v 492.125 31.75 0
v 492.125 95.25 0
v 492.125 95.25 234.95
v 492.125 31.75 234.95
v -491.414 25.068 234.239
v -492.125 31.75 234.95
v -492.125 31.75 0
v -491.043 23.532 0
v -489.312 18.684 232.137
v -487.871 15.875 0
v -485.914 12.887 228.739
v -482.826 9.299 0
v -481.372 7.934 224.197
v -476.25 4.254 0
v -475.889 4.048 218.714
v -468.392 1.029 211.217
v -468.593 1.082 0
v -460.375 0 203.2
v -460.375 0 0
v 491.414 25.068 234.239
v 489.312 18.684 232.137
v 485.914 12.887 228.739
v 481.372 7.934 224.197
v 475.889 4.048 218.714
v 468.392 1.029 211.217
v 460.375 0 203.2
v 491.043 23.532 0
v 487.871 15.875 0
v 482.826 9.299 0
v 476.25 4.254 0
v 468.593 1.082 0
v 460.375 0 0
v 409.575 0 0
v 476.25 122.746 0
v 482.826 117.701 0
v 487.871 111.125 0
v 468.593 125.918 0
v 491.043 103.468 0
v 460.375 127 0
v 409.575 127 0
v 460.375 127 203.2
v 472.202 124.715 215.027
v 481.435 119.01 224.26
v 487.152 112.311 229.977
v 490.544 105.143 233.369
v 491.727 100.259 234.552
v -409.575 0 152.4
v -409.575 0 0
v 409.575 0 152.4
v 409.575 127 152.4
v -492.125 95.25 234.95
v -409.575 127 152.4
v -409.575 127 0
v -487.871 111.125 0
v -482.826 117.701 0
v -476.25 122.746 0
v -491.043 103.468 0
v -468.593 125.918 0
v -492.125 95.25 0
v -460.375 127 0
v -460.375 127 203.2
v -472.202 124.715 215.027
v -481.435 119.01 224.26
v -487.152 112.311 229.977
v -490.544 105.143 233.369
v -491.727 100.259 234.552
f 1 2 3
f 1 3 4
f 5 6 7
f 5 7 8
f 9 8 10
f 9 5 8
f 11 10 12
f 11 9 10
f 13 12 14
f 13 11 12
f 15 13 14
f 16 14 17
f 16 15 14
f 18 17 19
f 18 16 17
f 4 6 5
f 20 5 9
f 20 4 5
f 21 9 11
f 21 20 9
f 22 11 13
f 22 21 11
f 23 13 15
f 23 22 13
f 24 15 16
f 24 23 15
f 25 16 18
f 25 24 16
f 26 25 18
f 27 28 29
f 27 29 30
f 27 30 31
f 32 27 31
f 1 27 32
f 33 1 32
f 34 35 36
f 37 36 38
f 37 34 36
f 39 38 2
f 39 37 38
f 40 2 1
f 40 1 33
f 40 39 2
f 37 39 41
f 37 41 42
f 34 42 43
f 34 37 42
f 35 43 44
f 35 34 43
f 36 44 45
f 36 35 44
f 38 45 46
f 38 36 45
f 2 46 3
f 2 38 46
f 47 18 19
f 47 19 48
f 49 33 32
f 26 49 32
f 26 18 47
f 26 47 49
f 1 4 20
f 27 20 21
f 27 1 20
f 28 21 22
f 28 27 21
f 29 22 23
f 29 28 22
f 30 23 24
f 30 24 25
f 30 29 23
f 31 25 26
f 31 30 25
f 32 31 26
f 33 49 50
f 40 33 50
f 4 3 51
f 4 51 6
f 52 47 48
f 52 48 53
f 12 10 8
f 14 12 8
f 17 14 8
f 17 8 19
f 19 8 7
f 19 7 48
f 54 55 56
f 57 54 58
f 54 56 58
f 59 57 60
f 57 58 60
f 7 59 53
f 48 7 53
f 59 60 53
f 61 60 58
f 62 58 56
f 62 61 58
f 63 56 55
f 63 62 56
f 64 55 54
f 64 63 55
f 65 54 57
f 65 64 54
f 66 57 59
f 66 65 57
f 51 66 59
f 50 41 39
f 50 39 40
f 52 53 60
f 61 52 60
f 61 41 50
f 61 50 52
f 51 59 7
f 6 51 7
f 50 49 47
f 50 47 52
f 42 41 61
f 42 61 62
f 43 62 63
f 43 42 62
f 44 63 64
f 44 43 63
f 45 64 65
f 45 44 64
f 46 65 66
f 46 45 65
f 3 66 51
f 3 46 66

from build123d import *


with BuildPart() as part:
    # Sweep1: sweep along a path in Sketch2
    with BuildLine(Plane(origin=(0, 0, 0), x_dir=(1, 0, 0), z_dir=(0, 1, 0))) as sweep1_path:
        Line((-409.575, 0), (-409.575, -152.4))
        Line((-409.575, -152.4), (409.575, -152.4))
        Line((409.575, -152.4), (409.575, 0))
    # Sketch1 → Sweep1 (sweep)
    with BuildSketch(Plane.XY):
        with BuildLine():
            Line((-428.625, 127), (-460.375, 127))
            ThreePointArc((-460.375, 127), (-482.825640303, 117.700640303), (-492.125, 95.25))
            Line((-492.125, 95.25), (-492.125, 31.75))
            ThreePointArc((-492.125, 31.75), (-482.825640303, 9.299359697), (-460.375, 0))
            Line((-460.375, 0), (-428.625, 0))
            Line((-428.625, 0), (-409.575, 0))
            Line((-409.575, 0), (-409.575, 127))
            Line((-409.575, 127), (-428.625, 127))
        make_face()
    sweep(path=sweep1_path.line, transition=Transition.RIGHT)


solid = part.part
